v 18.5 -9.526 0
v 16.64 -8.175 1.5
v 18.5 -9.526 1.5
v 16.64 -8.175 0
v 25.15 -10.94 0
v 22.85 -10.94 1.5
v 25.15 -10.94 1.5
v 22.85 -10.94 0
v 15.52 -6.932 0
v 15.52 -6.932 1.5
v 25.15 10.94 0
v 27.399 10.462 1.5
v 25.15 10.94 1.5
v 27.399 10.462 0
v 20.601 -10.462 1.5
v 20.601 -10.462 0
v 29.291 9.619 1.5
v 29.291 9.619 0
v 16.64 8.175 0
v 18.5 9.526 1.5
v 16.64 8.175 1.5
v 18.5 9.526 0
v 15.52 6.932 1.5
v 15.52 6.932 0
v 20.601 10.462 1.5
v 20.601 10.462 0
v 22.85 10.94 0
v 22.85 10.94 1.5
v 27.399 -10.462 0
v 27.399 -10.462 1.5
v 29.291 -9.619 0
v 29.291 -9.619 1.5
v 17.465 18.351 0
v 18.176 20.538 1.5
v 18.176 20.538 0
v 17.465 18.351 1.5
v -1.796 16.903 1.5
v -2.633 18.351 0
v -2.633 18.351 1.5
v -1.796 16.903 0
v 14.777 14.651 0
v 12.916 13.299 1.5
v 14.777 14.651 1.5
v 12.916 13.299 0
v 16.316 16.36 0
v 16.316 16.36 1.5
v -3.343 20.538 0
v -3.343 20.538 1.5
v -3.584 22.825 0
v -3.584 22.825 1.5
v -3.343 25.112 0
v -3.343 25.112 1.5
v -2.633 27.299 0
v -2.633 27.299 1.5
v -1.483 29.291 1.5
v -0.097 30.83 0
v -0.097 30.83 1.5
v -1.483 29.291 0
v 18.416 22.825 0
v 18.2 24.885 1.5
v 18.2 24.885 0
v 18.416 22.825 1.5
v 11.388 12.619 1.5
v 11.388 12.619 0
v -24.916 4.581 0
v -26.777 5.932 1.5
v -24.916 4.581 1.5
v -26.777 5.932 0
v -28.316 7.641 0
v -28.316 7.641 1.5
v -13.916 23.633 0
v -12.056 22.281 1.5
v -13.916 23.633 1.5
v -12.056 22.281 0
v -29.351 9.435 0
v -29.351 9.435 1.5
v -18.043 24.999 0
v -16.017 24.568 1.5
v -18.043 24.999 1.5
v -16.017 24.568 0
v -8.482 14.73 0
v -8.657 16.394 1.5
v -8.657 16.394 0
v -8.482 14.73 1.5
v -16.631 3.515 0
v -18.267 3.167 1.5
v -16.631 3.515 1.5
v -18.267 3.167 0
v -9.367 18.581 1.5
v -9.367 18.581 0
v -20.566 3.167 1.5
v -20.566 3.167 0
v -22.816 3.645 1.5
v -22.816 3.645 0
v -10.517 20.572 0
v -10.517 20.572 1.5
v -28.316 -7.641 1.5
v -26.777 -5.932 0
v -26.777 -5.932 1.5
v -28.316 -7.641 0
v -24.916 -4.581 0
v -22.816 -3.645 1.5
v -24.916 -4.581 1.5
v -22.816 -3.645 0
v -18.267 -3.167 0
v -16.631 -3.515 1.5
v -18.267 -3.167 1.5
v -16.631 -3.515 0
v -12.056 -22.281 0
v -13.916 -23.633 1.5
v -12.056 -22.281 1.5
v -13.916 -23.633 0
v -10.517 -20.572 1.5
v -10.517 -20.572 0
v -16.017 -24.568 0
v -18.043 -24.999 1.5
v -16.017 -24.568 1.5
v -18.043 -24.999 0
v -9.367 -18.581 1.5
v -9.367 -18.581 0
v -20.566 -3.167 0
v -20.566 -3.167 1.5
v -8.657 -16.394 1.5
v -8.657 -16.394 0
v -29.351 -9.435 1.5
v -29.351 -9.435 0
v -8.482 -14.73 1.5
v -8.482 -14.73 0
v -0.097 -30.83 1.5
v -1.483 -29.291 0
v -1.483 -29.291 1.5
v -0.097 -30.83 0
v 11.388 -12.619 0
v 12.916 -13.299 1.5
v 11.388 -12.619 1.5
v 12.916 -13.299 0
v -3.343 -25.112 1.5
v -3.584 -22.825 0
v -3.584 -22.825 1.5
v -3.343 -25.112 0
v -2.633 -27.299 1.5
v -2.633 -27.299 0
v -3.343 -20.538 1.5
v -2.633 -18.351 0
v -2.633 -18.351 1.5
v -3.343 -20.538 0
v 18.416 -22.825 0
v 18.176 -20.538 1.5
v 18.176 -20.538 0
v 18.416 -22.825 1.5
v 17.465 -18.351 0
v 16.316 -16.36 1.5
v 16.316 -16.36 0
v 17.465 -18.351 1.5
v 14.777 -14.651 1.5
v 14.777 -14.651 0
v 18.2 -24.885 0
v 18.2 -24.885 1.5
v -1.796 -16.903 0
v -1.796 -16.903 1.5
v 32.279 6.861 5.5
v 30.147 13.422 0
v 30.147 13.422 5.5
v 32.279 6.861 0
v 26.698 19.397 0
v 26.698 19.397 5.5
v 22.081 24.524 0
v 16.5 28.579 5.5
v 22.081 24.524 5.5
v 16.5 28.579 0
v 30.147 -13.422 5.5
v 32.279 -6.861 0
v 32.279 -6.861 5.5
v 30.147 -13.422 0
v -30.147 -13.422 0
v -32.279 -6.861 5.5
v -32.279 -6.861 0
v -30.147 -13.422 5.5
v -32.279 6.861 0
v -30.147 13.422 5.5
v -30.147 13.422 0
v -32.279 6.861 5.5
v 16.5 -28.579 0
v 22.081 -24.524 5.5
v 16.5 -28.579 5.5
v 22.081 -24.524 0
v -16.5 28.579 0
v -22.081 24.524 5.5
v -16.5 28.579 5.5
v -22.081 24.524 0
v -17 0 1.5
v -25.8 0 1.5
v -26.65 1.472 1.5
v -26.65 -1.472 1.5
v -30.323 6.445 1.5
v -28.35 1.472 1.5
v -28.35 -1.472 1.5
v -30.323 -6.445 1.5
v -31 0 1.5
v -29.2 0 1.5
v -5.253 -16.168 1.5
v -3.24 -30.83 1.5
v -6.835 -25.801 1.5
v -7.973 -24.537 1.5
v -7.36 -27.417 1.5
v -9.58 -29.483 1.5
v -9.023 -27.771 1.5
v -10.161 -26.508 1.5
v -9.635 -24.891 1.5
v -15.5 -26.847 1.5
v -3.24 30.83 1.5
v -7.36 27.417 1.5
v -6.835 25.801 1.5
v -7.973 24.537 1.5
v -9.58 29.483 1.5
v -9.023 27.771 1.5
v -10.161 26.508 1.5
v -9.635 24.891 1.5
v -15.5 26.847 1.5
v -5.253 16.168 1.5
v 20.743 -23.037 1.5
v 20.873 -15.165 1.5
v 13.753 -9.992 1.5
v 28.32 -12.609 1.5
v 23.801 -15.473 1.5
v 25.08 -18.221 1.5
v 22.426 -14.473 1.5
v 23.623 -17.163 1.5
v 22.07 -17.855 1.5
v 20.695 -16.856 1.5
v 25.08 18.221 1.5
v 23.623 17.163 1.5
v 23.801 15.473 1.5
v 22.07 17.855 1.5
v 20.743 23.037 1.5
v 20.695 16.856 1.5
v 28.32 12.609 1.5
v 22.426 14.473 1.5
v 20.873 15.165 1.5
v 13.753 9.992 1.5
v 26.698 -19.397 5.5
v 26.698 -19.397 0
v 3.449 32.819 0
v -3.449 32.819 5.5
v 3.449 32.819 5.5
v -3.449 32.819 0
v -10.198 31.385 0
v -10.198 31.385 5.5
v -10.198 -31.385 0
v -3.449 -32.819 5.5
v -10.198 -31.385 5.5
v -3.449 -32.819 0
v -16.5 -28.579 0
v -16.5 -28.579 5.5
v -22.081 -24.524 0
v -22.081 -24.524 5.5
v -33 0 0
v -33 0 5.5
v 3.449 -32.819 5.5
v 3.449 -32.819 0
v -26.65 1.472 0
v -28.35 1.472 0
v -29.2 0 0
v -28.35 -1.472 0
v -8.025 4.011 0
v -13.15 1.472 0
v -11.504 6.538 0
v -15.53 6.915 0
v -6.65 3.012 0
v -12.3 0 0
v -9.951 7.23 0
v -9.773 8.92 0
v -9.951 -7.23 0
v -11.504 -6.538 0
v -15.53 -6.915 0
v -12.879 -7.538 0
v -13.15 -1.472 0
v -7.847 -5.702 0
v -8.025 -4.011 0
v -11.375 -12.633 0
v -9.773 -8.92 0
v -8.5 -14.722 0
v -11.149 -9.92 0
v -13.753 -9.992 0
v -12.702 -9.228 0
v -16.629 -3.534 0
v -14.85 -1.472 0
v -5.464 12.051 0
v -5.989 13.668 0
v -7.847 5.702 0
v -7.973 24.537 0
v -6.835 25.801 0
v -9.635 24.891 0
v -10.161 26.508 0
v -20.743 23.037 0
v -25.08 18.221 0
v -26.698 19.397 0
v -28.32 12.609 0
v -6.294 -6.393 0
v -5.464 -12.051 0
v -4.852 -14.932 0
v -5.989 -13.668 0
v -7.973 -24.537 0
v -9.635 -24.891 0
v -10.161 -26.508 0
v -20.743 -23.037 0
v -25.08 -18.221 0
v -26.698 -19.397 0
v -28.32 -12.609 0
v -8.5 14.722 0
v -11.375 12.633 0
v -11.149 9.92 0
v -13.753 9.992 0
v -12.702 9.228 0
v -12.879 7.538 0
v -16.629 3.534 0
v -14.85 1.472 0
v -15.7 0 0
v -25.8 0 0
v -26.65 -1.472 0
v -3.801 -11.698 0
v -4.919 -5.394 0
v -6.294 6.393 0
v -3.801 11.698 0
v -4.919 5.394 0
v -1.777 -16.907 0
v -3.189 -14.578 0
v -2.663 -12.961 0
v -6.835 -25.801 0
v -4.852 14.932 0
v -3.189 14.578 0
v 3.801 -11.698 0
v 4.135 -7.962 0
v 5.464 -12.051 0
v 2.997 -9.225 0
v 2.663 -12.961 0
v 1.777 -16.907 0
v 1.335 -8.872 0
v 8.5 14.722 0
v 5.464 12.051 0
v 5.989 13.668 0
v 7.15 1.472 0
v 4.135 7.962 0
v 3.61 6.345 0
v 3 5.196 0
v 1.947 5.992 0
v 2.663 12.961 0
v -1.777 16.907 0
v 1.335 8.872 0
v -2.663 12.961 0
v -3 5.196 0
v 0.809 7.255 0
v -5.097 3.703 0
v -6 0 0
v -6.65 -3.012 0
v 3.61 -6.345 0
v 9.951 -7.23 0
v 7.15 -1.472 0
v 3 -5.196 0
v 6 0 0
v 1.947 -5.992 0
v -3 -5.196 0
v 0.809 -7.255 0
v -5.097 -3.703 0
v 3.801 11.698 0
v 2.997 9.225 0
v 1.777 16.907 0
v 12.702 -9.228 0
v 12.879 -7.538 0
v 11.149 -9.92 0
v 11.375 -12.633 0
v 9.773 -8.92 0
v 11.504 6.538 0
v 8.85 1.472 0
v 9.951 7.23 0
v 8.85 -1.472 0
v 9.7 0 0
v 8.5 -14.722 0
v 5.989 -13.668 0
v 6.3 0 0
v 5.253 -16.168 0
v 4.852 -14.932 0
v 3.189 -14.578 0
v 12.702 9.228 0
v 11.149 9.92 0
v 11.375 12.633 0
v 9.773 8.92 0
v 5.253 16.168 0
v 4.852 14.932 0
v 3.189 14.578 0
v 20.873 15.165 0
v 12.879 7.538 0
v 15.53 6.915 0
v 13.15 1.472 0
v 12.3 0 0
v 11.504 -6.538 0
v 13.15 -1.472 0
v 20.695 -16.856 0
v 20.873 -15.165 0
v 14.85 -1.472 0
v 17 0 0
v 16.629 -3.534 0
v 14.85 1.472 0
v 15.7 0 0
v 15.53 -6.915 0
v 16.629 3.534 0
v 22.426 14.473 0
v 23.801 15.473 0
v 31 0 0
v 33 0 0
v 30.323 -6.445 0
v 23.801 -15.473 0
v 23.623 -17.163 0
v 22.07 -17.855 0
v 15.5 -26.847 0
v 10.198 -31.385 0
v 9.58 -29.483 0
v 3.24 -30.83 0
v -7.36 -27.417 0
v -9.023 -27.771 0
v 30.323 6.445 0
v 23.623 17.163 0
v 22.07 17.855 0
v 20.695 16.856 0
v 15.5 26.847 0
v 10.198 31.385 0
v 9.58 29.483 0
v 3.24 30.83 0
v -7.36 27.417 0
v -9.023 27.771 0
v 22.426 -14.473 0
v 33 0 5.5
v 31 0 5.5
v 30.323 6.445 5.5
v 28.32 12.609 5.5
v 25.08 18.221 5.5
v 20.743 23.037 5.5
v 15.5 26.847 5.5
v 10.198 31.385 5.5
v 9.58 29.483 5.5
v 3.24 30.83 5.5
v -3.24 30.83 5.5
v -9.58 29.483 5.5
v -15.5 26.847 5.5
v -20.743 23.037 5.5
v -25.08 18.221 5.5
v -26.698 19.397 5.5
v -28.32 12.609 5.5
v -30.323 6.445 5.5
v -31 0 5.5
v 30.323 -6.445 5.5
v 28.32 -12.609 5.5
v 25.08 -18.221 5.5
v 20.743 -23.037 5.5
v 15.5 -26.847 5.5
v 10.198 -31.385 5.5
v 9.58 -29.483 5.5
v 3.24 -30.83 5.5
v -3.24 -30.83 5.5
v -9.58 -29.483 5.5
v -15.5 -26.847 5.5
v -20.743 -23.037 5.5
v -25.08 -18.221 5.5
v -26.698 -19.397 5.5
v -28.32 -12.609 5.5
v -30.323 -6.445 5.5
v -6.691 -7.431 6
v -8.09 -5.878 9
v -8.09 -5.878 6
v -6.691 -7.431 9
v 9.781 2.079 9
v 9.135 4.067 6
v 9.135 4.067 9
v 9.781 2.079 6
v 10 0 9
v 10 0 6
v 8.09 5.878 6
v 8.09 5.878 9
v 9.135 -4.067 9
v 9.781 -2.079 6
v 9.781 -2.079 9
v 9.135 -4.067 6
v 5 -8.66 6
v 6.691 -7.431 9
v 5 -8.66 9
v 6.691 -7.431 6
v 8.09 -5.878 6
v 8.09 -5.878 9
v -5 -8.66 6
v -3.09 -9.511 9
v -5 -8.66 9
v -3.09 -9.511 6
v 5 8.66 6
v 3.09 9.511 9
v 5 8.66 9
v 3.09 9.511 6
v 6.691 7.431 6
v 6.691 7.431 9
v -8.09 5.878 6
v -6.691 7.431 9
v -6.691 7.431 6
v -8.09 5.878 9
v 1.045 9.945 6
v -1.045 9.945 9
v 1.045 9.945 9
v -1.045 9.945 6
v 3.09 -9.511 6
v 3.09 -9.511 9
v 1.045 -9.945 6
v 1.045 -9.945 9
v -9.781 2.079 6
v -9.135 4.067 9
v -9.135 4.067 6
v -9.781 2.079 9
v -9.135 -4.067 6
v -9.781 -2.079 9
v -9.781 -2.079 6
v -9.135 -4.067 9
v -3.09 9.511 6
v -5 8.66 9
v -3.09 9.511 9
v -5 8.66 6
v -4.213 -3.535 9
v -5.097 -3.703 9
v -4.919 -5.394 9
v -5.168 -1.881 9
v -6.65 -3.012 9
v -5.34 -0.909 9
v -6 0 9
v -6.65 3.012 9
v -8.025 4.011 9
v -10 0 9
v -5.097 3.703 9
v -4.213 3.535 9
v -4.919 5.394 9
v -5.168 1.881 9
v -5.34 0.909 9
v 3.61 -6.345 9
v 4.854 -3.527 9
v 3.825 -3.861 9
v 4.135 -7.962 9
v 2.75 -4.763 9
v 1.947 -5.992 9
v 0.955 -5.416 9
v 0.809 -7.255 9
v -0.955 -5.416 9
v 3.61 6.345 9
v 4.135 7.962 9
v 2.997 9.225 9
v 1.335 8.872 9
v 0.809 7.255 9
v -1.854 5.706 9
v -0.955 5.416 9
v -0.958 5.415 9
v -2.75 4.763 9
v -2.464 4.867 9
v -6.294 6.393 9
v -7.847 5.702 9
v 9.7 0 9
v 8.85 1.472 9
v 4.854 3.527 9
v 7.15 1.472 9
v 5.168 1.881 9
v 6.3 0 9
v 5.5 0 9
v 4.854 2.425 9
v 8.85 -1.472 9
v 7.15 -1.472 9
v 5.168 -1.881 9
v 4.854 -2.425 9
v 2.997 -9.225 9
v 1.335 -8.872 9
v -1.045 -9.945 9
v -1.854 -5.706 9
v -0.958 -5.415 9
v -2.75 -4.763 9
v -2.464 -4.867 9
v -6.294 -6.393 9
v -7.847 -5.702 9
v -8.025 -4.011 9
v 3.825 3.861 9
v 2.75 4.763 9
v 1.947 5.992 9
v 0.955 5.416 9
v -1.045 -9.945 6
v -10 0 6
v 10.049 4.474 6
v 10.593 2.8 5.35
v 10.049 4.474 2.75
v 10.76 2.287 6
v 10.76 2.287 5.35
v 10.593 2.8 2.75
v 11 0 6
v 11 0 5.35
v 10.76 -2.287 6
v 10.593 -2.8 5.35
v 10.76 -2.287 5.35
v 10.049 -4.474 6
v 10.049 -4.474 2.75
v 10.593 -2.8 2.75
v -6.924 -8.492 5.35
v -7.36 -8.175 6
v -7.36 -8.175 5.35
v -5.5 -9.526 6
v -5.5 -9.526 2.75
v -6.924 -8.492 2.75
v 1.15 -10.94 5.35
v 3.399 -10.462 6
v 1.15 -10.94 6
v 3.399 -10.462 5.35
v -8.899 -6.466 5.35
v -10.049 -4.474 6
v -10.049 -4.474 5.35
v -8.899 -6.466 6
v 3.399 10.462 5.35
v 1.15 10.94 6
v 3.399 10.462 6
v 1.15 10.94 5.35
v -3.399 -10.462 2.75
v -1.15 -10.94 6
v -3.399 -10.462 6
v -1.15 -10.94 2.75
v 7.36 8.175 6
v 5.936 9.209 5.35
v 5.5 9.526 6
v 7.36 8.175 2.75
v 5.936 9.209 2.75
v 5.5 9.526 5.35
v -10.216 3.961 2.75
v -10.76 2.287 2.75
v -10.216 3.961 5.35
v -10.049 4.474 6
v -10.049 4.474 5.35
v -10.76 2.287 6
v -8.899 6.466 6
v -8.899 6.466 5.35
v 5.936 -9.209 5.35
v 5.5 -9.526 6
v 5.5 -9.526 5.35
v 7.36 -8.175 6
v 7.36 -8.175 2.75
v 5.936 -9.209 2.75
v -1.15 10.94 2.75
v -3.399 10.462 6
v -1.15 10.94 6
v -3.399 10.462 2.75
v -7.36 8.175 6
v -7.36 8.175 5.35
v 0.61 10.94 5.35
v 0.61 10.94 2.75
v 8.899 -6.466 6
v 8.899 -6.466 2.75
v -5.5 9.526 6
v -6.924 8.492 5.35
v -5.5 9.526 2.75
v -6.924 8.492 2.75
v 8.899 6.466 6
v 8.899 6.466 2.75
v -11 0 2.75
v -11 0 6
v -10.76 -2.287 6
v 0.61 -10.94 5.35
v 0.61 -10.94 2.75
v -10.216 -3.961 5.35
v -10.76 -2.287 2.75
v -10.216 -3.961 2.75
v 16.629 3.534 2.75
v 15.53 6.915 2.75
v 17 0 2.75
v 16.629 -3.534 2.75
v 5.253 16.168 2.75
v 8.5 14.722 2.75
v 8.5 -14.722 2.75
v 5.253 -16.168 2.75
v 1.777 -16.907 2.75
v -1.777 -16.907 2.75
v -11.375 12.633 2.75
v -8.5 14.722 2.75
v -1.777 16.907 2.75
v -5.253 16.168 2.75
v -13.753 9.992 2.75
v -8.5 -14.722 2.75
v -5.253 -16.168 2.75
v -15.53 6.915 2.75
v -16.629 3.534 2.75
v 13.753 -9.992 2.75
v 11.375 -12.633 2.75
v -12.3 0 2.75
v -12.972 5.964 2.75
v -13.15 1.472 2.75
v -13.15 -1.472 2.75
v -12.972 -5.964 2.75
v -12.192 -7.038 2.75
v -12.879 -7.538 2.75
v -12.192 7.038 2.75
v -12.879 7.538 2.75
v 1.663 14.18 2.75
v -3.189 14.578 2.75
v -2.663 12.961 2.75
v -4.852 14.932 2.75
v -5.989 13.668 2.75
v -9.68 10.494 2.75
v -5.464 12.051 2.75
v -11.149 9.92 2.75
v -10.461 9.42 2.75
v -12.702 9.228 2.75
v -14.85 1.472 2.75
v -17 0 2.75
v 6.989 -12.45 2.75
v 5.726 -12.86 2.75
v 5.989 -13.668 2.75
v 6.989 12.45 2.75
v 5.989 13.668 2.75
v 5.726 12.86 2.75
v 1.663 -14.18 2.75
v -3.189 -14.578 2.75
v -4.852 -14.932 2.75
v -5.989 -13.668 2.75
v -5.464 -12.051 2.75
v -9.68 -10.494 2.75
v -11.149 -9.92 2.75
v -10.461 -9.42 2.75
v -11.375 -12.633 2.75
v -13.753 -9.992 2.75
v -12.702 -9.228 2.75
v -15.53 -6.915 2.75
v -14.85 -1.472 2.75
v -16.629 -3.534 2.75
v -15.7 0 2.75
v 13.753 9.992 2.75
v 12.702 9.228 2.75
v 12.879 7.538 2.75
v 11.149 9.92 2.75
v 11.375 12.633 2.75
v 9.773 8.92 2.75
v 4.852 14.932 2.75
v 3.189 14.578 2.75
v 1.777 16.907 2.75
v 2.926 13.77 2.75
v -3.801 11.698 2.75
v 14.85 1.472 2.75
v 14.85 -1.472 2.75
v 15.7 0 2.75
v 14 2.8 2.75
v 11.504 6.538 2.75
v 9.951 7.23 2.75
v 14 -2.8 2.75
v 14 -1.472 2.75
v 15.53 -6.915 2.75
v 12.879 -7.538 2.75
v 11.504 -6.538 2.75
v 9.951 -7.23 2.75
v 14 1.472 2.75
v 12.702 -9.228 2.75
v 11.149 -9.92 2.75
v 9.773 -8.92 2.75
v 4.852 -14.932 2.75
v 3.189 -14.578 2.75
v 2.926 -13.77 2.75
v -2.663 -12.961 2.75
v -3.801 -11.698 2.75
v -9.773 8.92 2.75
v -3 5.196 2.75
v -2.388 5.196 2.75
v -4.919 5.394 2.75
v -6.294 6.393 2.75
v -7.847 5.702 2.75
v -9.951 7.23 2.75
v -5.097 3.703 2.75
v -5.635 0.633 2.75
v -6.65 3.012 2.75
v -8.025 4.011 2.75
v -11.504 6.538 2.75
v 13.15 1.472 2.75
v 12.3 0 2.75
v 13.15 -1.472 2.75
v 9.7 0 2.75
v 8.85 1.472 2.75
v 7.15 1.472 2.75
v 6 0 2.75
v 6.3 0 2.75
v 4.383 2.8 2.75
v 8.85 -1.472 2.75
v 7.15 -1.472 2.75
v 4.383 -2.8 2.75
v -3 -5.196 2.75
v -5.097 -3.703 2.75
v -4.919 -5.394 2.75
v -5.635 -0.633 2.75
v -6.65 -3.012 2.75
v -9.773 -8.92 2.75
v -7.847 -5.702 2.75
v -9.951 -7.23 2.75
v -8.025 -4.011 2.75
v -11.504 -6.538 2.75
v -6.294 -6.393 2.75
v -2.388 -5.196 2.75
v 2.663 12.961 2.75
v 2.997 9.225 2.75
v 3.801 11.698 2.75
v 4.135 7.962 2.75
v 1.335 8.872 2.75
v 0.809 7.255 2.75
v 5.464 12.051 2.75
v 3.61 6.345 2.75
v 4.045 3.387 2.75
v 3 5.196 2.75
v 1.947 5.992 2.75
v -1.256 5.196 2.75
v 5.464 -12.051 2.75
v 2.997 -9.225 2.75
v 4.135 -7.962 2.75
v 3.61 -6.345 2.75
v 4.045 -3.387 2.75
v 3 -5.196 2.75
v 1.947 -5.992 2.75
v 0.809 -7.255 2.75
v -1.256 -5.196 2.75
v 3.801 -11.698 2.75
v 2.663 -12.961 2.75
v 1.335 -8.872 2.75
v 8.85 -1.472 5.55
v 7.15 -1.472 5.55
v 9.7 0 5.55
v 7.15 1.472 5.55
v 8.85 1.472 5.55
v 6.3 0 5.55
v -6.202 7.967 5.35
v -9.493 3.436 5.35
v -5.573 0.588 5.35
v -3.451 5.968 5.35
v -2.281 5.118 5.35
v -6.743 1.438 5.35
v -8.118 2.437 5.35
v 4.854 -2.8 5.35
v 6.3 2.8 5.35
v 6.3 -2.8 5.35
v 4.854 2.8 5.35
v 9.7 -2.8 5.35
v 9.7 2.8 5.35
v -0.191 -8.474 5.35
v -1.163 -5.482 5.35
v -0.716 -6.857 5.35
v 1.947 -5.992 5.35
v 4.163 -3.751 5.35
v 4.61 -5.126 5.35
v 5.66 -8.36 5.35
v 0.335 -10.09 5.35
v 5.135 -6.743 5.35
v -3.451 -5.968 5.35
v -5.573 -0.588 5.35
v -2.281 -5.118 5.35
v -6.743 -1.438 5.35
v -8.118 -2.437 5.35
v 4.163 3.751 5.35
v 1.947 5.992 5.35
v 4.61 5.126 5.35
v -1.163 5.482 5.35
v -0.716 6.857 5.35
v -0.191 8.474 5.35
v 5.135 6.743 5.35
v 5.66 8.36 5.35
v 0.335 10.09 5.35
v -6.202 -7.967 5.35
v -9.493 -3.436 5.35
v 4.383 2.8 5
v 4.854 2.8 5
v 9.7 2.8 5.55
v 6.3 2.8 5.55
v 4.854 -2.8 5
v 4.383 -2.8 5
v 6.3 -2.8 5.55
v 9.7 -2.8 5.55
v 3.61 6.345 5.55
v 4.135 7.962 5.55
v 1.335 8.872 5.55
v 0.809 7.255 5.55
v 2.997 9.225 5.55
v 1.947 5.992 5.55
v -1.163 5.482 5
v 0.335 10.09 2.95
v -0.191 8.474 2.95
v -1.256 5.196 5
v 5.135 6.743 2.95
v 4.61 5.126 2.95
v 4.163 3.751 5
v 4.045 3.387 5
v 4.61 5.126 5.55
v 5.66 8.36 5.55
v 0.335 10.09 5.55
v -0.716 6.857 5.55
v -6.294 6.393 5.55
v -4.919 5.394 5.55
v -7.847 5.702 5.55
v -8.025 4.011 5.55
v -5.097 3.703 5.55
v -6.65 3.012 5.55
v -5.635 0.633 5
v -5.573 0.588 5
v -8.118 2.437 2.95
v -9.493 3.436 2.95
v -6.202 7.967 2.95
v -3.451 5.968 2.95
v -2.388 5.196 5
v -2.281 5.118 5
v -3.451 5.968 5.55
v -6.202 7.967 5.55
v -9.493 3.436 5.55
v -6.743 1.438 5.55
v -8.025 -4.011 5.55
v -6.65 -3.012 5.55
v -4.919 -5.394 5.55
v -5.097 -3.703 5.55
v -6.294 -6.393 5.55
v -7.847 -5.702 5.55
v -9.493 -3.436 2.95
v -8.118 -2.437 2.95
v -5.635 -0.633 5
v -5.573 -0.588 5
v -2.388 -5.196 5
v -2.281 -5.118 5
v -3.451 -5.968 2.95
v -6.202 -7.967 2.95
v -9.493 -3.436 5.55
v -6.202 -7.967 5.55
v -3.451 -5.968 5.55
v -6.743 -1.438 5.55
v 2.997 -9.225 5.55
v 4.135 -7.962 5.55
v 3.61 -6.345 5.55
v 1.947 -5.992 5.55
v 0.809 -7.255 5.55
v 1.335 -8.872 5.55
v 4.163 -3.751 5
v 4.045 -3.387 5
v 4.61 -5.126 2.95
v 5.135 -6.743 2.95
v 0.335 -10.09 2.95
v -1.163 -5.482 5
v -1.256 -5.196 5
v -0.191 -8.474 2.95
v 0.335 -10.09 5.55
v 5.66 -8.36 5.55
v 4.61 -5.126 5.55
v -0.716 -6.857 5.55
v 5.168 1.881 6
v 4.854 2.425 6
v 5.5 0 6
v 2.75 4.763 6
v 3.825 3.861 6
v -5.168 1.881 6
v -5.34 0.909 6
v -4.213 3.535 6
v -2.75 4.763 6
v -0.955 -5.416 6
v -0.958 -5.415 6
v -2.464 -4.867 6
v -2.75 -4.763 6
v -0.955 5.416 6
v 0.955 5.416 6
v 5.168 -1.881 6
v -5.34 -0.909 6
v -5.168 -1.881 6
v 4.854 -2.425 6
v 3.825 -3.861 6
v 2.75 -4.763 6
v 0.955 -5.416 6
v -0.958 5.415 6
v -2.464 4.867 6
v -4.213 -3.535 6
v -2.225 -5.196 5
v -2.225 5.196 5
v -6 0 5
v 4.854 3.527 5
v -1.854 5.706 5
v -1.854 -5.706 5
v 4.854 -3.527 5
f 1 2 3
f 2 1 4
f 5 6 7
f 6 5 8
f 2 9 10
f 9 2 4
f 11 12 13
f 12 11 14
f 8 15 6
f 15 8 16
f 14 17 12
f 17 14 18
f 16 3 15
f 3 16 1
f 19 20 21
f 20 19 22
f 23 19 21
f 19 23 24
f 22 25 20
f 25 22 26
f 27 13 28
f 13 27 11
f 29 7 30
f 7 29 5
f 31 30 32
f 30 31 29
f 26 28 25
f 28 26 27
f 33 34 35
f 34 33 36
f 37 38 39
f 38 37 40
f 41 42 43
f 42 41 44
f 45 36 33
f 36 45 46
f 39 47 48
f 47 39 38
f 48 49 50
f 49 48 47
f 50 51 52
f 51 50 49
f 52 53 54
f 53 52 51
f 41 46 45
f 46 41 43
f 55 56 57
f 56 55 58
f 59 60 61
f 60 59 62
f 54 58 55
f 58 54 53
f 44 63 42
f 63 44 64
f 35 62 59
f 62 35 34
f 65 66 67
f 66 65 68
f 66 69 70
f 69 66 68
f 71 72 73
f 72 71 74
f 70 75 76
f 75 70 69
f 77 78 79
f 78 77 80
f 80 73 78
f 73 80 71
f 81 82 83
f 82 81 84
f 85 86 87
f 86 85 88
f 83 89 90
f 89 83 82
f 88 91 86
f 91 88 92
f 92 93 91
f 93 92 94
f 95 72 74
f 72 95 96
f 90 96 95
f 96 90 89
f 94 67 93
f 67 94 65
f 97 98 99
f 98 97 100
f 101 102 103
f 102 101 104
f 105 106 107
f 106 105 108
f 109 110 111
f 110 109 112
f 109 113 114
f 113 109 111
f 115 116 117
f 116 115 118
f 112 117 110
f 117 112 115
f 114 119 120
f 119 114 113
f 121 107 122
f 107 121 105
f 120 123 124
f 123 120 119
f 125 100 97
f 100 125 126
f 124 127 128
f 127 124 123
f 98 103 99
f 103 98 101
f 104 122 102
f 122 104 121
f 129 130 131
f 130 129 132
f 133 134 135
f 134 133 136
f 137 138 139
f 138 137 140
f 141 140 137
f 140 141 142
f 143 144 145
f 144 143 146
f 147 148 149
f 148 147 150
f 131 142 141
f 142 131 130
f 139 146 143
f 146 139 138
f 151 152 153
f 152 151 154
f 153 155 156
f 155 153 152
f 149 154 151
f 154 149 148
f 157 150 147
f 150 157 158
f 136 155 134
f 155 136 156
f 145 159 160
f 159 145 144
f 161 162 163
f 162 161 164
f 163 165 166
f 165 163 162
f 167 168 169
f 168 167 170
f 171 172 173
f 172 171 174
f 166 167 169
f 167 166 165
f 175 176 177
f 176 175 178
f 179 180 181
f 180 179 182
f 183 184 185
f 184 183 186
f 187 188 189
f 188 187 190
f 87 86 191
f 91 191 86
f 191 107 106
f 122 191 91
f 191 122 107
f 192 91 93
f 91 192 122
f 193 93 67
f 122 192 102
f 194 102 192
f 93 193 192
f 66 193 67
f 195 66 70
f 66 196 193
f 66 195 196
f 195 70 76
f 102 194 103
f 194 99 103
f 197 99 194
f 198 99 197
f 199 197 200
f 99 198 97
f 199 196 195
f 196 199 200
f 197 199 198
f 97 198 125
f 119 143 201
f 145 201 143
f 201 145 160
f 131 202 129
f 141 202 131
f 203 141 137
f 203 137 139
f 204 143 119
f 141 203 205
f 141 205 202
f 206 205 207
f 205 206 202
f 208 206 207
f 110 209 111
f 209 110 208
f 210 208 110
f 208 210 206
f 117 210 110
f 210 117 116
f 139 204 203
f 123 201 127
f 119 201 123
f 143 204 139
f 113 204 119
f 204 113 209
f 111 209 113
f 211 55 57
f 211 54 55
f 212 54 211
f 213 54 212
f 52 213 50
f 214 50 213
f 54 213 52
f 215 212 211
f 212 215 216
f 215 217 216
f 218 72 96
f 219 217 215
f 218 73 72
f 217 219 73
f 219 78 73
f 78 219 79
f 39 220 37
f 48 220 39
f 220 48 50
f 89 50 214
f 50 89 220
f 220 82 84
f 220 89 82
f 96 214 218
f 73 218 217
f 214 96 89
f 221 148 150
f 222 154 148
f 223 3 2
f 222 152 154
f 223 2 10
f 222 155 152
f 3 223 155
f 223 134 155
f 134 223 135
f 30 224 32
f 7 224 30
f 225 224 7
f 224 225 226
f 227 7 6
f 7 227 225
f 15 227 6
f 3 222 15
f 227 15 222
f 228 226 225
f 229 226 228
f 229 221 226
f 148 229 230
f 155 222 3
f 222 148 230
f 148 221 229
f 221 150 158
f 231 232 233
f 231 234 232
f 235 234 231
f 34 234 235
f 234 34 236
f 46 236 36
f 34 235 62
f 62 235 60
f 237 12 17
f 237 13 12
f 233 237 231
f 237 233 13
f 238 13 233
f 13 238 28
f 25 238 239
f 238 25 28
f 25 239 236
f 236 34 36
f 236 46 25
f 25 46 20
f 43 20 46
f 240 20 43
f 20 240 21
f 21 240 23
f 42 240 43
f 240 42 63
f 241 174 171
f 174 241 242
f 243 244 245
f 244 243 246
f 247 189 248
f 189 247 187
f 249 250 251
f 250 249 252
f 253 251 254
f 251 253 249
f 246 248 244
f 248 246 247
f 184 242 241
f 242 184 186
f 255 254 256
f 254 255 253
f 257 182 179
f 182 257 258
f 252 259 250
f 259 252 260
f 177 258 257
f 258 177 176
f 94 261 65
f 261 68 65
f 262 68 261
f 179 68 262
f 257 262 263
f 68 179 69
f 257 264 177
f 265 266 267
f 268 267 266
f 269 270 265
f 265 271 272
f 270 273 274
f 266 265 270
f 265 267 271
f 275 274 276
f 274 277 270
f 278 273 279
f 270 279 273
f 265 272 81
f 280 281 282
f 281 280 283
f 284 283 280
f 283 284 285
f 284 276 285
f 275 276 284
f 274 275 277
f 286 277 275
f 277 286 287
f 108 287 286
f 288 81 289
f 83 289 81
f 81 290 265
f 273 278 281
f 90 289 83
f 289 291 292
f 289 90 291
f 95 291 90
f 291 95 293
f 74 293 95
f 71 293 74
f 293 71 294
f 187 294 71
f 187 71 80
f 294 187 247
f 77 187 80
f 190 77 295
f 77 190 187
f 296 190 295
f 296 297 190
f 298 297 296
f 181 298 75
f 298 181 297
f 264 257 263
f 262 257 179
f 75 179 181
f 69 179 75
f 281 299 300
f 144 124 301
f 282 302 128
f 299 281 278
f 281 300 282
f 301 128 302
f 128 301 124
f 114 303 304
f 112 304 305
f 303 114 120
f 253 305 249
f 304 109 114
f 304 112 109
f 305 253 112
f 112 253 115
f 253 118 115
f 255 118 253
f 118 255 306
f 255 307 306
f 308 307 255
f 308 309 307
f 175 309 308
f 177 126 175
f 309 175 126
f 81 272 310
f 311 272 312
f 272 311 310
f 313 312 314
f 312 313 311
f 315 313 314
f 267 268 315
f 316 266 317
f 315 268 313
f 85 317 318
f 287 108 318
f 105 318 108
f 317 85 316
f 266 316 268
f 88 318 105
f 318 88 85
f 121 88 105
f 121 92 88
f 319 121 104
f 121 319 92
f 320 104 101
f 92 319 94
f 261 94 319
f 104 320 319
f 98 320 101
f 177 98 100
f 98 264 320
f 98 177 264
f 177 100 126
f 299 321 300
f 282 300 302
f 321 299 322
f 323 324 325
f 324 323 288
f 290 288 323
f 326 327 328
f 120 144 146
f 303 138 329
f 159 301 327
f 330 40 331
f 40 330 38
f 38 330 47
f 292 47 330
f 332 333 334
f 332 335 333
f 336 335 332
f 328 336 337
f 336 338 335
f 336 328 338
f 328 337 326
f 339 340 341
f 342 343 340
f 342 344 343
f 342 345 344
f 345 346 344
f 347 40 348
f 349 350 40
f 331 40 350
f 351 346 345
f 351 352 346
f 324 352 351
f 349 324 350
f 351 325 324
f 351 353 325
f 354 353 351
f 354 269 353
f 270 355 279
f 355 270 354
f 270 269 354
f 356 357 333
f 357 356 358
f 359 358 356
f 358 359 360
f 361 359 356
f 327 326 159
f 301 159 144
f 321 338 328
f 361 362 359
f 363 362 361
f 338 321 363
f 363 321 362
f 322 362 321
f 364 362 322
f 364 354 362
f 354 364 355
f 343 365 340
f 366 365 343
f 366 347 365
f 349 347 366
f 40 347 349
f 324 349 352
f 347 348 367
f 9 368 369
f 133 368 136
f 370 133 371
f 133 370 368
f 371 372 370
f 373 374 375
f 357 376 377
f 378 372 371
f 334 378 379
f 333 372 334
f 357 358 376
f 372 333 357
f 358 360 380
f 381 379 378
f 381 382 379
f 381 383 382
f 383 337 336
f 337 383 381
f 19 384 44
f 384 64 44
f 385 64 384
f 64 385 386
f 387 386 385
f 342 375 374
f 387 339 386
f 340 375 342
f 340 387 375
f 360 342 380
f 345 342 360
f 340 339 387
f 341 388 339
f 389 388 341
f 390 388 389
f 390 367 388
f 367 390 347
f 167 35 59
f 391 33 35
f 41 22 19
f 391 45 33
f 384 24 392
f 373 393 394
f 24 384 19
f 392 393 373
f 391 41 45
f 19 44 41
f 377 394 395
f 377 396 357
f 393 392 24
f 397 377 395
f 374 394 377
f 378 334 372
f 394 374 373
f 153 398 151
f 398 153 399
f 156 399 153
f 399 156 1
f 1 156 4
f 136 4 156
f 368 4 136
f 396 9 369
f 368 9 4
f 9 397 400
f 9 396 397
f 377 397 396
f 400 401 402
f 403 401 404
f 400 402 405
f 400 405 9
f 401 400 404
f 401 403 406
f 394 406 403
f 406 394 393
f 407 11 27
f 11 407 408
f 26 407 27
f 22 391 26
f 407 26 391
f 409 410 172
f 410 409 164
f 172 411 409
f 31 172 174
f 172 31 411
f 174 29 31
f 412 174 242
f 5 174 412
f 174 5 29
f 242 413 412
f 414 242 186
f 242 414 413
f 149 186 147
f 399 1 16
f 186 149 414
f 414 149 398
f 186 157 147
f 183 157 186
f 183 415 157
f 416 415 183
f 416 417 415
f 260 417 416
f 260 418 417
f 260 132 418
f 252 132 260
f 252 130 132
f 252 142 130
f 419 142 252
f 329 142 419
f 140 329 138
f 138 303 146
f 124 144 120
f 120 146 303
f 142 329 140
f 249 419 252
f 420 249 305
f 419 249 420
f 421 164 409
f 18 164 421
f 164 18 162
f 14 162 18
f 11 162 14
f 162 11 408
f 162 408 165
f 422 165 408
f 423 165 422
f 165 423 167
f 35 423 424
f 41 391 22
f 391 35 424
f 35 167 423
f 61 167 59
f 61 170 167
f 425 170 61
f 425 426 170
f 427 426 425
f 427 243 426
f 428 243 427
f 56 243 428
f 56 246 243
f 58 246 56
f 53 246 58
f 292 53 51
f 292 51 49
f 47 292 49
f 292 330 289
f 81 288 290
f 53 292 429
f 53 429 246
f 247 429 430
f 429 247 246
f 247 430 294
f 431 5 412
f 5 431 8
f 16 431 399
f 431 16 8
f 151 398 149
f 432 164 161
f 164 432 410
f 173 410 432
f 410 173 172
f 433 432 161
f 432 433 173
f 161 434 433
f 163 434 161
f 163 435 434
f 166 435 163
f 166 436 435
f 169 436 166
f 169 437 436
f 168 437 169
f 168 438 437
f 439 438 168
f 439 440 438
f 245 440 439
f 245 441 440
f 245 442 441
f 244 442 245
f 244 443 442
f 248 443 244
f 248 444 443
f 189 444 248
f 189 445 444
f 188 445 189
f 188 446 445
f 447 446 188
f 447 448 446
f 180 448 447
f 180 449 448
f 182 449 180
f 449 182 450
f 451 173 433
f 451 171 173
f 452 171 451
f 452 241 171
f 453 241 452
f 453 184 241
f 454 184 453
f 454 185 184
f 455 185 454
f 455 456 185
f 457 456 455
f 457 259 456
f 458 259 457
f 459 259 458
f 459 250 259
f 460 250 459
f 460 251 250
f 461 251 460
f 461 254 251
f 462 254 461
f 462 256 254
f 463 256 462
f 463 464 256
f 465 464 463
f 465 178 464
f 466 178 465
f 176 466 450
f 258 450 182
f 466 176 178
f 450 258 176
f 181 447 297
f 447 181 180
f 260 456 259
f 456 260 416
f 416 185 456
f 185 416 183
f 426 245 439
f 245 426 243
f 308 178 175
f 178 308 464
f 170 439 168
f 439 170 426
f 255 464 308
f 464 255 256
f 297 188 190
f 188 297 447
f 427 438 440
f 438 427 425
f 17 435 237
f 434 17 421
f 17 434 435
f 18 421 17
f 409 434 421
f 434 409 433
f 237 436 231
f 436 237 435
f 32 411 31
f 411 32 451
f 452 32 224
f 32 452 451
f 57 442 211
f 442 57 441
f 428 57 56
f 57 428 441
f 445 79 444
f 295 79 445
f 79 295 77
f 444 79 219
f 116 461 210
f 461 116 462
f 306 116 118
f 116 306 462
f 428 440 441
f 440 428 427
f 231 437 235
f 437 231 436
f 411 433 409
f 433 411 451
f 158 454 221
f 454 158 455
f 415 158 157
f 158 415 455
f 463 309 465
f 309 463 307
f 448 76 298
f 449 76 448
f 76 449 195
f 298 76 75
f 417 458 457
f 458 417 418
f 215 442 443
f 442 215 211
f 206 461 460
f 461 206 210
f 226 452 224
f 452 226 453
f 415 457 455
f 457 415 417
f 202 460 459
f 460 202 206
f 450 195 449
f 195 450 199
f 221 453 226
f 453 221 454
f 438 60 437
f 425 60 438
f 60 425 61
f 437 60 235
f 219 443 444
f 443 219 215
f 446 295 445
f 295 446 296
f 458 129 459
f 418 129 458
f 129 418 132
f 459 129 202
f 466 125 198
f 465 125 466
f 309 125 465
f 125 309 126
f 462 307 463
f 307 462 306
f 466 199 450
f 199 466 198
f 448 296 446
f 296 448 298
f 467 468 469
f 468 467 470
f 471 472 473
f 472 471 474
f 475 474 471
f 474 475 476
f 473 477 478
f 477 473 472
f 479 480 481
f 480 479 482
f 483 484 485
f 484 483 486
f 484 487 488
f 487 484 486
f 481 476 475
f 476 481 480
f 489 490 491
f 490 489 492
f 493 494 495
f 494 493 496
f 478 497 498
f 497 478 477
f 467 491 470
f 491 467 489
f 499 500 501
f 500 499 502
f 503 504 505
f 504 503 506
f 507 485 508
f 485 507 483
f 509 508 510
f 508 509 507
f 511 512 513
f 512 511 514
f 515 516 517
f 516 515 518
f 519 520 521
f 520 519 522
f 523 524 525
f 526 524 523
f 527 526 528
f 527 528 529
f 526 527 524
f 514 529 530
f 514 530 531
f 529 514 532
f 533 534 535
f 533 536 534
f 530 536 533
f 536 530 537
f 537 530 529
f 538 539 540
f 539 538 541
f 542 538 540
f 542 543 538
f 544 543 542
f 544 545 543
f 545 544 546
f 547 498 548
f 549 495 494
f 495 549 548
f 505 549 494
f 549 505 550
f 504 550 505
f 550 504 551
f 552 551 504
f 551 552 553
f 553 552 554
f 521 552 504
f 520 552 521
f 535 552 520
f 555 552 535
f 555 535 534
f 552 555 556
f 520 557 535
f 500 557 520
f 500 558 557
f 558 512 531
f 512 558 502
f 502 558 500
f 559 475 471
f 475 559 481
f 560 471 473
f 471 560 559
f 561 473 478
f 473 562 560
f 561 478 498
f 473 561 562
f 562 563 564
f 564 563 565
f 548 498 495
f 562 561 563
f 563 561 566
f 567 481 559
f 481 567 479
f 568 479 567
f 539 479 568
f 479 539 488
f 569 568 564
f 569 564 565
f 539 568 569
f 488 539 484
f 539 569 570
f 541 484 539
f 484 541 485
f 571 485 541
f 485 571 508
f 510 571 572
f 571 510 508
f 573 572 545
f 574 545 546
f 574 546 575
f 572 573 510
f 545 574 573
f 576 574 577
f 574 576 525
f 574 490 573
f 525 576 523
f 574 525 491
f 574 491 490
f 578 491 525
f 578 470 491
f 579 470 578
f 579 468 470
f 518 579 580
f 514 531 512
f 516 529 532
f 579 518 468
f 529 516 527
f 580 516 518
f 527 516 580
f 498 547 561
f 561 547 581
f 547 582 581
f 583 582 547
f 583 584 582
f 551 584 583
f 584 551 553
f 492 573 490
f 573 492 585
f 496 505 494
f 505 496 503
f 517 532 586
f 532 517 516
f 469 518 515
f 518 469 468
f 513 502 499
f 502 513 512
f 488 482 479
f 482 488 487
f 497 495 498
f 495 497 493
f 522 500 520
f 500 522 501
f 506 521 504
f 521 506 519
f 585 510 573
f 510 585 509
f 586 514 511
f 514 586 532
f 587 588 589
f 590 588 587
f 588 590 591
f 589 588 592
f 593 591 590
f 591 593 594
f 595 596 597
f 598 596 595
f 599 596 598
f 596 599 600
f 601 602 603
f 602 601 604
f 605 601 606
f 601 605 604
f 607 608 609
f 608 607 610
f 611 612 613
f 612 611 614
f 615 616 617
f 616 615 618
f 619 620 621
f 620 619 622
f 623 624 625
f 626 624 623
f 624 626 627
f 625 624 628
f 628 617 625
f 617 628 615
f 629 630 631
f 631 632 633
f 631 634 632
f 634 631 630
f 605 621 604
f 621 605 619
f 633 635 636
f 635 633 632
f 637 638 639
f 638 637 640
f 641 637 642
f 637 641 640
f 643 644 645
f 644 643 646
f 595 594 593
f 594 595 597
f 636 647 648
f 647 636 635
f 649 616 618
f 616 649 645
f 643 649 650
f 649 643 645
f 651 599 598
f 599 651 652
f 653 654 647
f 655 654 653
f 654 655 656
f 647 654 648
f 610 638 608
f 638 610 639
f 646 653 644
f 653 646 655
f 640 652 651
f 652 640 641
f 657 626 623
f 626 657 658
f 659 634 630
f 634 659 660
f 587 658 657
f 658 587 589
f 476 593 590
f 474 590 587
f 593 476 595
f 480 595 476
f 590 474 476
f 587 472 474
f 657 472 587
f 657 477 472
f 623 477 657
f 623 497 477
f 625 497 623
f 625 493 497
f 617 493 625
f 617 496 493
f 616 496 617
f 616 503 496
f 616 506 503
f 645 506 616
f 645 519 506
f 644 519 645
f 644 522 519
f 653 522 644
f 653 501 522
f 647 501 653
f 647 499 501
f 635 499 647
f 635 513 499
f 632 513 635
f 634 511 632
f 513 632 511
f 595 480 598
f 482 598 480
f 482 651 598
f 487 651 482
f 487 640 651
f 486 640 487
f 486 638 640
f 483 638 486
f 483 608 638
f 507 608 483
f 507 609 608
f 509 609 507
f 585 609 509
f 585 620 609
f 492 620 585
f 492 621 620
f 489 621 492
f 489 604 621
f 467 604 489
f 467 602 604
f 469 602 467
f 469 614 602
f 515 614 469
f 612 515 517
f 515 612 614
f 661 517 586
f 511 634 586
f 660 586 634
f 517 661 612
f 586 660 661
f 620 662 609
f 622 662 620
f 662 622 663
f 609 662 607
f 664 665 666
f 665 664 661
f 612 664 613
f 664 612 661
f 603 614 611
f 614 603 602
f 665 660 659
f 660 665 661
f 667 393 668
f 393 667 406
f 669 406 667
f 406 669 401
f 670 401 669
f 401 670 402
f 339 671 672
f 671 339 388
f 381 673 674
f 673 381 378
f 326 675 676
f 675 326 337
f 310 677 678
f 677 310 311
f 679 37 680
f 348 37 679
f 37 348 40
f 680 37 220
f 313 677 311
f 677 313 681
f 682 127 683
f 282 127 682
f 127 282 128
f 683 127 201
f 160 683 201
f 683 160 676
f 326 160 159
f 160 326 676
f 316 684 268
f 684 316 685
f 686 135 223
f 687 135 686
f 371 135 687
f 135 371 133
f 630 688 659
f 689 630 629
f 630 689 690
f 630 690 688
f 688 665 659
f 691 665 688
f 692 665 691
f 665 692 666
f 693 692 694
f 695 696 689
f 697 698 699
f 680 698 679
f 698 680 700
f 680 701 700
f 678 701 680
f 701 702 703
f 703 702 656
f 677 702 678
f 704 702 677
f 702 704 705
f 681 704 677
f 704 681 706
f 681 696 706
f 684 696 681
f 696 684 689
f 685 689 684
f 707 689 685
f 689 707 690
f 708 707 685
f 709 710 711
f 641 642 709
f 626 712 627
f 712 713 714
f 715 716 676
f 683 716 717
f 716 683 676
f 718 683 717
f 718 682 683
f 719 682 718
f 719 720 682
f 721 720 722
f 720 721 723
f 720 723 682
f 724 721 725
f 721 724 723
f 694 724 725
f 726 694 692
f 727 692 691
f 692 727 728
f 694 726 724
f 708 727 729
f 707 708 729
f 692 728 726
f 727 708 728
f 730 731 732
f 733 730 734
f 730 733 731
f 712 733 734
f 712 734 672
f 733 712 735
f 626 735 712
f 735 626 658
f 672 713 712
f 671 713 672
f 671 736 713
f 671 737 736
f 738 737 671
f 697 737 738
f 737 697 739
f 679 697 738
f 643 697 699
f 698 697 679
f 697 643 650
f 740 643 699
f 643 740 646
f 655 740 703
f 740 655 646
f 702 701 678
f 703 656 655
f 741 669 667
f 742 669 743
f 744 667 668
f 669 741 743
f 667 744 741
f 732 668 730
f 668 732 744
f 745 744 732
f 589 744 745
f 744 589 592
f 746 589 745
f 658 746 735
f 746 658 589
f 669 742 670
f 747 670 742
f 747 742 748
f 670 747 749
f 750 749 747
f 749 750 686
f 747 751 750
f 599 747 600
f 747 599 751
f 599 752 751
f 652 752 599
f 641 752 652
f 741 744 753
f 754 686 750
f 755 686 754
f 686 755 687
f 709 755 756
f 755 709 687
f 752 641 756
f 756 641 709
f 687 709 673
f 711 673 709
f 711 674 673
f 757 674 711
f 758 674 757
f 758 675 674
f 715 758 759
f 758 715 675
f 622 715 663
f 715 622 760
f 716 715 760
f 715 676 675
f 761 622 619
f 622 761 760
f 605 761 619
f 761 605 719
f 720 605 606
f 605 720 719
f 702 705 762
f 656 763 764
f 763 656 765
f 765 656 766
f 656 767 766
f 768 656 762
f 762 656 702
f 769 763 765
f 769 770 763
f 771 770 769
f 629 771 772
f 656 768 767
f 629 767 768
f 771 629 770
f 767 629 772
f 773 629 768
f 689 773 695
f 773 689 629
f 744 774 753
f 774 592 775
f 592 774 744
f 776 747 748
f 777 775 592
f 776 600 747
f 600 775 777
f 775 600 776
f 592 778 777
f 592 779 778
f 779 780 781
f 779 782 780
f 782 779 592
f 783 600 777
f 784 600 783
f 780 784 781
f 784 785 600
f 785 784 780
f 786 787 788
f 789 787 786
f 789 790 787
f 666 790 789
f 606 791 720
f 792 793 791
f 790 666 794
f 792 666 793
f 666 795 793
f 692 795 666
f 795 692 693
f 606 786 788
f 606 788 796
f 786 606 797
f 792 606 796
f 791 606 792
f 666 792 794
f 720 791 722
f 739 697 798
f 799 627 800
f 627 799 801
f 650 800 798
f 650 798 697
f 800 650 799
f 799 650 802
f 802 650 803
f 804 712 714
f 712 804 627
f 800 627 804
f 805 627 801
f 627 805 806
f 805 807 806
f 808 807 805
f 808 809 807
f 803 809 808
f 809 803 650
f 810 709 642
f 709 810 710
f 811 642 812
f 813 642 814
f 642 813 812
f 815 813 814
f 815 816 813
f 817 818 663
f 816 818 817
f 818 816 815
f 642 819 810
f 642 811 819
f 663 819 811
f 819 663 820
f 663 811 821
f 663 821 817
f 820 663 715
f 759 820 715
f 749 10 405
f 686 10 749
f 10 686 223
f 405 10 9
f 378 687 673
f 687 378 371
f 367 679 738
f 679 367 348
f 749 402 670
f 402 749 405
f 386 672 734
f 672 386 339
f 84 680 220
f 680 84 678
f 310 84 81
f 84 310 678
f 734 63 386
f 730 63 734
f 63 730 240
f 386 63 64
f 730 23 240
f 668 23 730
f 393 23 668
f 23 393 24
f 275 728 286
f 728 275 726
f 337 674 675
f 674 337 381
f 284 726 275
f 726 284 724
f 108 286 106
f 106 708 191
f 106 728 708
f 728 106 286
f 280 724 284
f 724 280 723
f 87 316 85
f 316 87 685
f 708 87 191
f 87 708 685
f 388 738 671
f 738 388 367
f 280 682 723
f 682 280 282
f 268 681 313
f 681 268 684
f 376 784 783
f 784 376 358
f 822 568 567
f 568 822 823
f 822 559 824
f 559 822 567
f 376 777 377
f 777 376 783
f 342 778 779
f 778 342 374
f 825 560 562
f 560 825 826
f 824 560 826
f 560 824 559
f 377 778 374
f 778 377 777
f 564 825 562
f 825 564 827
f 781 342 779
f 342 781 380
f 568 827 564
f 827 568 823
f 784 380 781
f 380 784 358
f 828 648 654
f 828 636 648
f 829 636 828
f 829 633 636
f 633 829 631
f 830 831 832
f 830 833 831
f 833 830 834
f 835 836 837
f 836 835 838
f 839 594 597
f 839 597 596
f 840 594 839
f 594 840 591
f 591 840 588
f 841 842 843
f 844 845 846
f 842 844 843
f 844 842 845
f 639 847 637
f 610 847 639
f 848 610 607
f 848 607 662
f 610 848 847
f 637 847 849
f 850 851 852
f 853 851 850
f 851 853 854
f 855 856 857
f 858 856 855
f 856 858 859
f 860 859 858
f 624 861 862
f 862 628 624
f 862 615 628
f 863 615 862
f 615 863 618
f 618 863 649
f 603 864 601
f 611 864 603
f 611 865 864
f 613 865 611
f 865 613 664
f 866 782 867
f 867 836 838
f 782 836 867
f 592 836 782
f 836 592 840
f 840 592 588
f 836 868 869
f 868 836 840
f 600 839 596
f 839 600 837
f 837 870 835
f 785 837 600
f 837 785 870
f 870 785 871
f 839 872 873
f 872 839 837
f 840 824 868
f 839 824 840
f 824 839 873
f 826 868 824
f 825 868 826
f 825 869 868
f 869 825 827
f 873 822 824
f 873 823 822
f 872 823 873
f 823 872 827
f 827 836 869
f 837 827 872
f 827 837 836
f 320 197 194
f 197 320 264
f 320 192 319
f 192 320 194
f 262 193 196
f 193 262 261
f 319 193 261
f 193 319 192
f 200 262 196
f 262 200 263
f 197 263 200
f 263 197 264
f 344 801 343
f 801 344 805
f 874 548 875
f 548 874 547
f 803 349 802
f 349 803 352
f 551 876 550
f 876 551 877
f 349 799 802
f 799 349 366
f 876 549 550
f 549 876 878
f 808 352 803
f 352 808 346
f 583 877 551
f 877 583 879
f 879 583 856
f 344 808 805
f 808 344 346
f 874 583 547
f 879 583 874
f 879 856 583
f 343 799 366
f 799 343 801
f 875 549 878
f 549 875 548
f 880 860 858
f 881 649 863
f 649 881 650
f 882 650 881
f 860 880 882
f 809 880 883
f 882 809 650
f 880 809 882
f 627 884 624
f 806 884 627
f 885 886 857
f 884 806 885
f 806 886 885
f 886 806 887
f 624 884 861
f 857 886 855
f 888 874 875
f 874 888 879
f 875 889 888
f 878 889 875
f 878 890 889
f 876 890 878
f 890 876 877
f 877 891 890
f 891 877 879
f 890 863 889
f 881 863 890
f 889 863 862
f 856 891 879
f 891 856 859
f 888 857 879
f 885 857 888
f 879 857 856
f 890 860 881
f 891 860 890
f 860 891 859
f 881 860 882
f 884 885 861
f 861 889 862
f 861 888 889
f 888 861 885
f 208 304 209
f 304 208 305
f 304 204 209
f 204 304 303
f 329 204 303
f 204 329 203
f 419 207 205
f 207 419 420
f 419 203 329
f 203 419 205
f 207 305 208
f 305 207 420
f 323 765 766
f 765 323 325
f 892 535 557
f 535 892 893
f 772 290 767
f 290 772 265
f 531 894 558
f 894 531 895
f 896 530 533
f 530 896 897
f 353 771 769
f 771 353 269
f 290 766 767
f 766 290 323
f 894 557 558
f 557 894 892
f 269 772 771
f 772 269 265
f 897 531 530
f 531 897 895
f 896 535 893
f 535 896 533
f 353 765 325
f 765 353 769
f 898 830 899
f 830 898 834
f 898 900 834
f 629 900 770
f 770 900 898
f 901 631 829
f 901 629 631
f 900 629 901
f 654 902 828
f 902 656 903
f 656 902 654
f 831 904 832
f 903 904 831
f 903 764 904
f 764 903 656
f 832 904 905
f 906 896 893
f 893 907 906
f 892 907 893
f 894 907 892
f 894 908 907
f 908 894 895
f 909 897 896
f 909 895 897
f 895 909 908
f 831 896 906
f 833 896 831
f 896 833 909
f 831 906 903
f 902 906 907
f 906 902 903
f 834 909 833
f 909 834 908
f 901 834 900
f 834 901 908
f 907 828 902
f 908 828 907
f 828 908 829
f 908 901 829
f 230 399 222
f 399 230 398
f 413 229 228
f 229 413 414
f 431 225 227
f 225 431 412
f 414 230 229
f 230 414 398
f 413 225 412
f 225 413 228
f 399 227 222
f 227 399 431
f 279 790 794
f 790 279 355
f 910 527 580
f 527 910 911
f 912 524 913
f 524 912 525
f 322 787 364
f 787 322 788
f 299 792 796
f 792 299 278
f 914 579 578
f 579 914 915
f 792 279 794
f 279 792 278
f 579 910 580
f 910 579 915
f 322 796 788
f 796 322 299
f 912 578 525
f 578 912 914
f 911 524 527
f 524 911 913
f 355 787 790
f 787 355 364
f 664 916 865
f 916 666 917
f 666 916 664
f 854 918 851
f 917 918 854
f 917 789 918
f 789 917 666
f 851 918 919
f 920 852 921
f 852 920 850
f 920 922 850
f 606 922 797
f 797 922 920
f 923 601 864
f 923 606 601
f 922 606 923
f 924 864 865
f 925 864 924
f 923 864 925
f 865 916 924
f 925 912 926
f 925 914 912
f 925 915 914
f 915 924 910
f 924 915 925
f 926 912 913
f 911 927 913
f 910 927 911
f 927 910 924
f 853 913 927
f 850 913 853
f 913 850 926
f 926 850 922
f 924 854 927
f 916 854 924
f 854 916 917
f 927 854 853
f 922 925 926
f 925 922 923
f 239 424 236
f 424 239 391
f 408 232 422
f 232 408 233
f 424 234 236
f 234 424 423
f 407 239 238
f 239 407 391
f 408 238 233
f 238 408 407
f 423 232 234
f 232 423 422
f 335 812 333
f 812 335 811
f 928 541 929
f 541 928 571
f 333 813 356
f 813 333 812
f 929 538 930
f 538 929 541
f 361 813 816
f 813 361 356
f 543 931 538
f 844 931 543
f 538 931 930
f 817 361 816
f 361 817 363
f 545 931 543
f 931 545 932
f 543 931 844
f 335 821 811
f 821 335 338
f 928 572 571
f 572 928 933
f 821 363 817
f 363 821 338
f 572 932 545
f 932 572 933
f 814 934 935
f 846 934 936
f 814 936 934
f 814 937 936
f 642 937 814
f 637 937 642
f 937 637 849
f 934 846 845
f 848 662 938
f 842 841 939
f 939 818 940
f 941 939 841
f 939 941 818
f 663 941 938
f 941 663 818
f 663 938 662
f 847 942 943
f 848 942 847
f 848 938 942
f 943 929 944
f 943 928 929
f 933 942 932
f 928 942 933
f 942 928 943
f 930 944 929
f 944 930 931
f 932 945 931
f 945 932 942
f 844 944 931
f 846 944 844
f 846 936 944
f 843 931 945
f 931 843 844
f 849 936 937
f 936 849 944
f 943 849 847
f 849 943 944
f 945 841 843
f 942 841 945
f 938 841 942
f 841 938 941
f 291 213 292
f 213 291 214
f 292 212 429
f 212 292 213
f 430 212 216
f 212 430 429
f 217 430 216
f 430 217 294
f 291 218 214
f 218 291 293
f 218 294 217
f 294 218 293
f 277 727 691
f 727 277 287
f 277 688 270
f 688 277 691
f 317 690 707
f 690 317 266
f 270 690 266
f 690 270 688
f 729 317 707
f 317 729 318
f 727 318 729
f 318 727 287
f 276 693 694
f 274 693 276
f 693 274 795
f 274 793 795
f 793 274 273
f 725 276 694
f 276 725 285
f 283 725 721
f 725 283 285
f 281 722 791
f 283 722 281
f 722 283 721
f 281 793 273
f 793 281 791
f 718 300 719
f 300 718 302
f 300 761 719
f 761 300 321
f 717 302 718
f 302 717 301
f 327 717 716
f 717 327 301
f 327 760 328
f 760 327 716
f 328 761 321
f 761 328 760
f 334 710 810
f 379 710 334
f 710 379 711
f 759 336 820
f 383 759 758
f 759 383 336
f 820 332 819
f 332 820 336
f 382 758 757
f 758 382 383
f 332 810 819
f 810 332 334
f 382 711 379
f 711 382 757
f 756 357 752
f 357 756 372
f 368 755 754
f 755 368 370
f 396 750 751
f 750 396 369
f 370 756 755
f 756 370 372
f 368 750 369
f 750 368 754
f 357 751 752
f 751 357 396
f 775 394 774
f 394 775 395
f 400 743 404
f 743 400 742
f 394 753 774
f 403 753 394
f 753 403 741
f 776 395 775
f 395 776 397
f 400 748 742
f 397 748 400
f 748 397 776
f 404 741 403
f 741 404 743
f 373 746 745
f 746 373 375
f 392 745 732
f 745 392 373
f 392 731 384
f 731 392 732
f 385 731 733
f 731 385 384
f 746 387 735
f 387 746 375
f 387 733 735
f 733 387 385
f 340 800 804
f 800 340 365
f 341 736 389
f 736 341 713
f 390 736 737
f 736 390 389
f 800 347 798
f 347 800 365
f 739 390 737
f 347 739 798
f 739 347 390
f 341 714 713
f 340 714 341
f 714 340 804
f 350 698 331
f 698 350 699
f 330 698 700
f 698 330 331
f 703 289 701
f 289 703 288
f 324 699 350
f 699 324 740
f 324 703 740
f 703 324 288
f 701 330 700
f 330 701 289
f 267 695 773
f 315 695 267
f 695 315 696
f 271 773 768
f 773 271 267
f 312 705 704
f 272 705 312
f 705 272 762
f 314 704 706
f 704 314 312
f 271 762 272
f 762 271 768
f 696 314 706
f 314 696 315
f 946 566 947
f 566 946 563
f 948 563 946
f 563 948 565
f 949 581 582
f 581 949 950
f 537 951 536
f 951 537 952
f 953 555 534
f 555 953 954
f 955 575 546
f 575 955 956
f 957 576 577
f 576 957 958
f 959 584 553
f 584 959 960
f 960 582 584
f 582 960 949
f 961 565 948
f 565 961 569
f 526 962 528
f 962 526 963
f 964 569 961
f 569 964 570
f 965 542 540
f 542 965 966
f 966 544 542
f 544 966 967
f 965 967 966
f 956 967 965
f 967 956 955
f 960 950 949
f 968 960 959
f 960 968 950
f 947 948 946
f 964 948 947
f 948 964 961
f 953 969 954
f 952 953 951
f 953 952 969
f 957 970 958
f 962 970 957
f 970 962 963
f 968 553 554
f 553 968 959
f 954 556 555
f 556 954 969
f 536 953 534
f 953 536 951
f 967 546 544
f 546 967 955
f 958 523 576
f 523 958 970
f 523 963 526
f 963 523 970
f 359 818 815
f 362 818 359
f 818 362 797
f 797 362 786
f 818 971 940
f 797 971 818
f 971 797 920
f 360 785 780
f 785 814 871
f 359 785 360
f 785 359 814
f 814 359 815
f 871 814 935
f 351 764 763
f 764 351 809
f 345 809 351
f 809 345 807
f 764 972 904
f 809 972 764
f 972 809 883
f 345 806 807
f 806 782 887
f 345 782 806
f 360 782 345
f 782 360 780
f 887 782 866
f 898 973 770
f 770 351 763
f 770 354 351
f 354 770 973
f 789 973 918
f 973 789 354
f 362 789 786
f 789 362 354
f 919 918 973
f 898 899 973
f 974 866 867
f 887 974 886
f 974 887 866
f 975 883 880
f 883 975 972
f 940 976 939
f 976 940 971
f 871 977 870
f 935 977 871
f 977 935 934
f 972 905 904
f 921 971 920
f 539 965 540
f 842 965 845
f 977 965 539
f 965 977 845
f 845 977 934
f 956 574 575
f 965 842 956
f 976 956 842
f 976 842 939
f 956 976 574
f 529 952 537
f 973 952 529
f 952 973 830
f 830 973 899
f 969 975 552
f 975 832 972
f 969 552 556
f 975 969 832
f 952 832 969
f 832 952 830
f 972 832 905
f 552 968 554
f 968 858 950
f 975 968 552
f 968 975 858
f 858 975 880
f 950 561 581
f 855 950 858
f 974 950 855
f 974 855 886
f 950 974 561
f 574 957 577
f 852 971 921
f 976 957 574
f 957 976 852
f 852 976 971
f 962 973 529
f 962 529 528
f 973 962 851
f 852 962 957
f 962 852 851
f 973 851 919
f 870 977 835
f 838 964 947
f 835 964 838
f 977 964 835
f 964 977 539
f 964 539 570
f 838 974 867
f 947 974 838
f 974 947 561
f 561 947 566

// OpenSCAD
//$fa = 6;
//$fs = 0.4;

under_stator();

module under_stator() {
    difference() {
        union () {
            cylinder(d=20, h=9);
            cylinder(d=22, h=6);
            
            cylinder(d=34, h=2.75);
            difference() {
                cylinder(d=66, h=1.5);
                for (i=[0:4]) {
                    rotate([0,0,i*72]) translate([24,0,-1]) cylinder(h=6, d=22);
                }
            }
            difference(){
                cylinder(d=66, h=5.5);
                translate([0,0,-1]) cylinder(d=62, h=7.5);
            }
        }
        
        translate([0,0,6]) cylinder(d=11, h=8);
        
        // encoder nut housing
        translate([0,0,-1]) cylinder(d=12, h=6, $fn=6);
        
        // encoder nut housing
        translate([0,0,5]) rotate([0,0,36]) cylinder(d=12, h=5, $fn=5);
        
        for (i=[0:4]) {
            rotate([0,0,i*72]) translate([8,0,-1]) cylinder(h=12, d=3.4);
            rotate([0,0,i*72]) translate([8,0,4.05]) cube([12,5.6,2.6], center=true);
            rotate([0,0,i*72]) translate([8,0,4.25]) cube([3.4,5.6,2.6], center=true);
            // outer mounting holes (far enough from edge and from upper nuts to not collide
            rotate([0,0,i*72]) translate([-27.5,0,-1]) cylinder(h=6, d=3.4);
        }
        
        for (i=[0:9]) {
            rotate([0,0,i*36]) translate([-14,0,-1]) cylinder(h=6, d=3.4);
        }
    }
}
